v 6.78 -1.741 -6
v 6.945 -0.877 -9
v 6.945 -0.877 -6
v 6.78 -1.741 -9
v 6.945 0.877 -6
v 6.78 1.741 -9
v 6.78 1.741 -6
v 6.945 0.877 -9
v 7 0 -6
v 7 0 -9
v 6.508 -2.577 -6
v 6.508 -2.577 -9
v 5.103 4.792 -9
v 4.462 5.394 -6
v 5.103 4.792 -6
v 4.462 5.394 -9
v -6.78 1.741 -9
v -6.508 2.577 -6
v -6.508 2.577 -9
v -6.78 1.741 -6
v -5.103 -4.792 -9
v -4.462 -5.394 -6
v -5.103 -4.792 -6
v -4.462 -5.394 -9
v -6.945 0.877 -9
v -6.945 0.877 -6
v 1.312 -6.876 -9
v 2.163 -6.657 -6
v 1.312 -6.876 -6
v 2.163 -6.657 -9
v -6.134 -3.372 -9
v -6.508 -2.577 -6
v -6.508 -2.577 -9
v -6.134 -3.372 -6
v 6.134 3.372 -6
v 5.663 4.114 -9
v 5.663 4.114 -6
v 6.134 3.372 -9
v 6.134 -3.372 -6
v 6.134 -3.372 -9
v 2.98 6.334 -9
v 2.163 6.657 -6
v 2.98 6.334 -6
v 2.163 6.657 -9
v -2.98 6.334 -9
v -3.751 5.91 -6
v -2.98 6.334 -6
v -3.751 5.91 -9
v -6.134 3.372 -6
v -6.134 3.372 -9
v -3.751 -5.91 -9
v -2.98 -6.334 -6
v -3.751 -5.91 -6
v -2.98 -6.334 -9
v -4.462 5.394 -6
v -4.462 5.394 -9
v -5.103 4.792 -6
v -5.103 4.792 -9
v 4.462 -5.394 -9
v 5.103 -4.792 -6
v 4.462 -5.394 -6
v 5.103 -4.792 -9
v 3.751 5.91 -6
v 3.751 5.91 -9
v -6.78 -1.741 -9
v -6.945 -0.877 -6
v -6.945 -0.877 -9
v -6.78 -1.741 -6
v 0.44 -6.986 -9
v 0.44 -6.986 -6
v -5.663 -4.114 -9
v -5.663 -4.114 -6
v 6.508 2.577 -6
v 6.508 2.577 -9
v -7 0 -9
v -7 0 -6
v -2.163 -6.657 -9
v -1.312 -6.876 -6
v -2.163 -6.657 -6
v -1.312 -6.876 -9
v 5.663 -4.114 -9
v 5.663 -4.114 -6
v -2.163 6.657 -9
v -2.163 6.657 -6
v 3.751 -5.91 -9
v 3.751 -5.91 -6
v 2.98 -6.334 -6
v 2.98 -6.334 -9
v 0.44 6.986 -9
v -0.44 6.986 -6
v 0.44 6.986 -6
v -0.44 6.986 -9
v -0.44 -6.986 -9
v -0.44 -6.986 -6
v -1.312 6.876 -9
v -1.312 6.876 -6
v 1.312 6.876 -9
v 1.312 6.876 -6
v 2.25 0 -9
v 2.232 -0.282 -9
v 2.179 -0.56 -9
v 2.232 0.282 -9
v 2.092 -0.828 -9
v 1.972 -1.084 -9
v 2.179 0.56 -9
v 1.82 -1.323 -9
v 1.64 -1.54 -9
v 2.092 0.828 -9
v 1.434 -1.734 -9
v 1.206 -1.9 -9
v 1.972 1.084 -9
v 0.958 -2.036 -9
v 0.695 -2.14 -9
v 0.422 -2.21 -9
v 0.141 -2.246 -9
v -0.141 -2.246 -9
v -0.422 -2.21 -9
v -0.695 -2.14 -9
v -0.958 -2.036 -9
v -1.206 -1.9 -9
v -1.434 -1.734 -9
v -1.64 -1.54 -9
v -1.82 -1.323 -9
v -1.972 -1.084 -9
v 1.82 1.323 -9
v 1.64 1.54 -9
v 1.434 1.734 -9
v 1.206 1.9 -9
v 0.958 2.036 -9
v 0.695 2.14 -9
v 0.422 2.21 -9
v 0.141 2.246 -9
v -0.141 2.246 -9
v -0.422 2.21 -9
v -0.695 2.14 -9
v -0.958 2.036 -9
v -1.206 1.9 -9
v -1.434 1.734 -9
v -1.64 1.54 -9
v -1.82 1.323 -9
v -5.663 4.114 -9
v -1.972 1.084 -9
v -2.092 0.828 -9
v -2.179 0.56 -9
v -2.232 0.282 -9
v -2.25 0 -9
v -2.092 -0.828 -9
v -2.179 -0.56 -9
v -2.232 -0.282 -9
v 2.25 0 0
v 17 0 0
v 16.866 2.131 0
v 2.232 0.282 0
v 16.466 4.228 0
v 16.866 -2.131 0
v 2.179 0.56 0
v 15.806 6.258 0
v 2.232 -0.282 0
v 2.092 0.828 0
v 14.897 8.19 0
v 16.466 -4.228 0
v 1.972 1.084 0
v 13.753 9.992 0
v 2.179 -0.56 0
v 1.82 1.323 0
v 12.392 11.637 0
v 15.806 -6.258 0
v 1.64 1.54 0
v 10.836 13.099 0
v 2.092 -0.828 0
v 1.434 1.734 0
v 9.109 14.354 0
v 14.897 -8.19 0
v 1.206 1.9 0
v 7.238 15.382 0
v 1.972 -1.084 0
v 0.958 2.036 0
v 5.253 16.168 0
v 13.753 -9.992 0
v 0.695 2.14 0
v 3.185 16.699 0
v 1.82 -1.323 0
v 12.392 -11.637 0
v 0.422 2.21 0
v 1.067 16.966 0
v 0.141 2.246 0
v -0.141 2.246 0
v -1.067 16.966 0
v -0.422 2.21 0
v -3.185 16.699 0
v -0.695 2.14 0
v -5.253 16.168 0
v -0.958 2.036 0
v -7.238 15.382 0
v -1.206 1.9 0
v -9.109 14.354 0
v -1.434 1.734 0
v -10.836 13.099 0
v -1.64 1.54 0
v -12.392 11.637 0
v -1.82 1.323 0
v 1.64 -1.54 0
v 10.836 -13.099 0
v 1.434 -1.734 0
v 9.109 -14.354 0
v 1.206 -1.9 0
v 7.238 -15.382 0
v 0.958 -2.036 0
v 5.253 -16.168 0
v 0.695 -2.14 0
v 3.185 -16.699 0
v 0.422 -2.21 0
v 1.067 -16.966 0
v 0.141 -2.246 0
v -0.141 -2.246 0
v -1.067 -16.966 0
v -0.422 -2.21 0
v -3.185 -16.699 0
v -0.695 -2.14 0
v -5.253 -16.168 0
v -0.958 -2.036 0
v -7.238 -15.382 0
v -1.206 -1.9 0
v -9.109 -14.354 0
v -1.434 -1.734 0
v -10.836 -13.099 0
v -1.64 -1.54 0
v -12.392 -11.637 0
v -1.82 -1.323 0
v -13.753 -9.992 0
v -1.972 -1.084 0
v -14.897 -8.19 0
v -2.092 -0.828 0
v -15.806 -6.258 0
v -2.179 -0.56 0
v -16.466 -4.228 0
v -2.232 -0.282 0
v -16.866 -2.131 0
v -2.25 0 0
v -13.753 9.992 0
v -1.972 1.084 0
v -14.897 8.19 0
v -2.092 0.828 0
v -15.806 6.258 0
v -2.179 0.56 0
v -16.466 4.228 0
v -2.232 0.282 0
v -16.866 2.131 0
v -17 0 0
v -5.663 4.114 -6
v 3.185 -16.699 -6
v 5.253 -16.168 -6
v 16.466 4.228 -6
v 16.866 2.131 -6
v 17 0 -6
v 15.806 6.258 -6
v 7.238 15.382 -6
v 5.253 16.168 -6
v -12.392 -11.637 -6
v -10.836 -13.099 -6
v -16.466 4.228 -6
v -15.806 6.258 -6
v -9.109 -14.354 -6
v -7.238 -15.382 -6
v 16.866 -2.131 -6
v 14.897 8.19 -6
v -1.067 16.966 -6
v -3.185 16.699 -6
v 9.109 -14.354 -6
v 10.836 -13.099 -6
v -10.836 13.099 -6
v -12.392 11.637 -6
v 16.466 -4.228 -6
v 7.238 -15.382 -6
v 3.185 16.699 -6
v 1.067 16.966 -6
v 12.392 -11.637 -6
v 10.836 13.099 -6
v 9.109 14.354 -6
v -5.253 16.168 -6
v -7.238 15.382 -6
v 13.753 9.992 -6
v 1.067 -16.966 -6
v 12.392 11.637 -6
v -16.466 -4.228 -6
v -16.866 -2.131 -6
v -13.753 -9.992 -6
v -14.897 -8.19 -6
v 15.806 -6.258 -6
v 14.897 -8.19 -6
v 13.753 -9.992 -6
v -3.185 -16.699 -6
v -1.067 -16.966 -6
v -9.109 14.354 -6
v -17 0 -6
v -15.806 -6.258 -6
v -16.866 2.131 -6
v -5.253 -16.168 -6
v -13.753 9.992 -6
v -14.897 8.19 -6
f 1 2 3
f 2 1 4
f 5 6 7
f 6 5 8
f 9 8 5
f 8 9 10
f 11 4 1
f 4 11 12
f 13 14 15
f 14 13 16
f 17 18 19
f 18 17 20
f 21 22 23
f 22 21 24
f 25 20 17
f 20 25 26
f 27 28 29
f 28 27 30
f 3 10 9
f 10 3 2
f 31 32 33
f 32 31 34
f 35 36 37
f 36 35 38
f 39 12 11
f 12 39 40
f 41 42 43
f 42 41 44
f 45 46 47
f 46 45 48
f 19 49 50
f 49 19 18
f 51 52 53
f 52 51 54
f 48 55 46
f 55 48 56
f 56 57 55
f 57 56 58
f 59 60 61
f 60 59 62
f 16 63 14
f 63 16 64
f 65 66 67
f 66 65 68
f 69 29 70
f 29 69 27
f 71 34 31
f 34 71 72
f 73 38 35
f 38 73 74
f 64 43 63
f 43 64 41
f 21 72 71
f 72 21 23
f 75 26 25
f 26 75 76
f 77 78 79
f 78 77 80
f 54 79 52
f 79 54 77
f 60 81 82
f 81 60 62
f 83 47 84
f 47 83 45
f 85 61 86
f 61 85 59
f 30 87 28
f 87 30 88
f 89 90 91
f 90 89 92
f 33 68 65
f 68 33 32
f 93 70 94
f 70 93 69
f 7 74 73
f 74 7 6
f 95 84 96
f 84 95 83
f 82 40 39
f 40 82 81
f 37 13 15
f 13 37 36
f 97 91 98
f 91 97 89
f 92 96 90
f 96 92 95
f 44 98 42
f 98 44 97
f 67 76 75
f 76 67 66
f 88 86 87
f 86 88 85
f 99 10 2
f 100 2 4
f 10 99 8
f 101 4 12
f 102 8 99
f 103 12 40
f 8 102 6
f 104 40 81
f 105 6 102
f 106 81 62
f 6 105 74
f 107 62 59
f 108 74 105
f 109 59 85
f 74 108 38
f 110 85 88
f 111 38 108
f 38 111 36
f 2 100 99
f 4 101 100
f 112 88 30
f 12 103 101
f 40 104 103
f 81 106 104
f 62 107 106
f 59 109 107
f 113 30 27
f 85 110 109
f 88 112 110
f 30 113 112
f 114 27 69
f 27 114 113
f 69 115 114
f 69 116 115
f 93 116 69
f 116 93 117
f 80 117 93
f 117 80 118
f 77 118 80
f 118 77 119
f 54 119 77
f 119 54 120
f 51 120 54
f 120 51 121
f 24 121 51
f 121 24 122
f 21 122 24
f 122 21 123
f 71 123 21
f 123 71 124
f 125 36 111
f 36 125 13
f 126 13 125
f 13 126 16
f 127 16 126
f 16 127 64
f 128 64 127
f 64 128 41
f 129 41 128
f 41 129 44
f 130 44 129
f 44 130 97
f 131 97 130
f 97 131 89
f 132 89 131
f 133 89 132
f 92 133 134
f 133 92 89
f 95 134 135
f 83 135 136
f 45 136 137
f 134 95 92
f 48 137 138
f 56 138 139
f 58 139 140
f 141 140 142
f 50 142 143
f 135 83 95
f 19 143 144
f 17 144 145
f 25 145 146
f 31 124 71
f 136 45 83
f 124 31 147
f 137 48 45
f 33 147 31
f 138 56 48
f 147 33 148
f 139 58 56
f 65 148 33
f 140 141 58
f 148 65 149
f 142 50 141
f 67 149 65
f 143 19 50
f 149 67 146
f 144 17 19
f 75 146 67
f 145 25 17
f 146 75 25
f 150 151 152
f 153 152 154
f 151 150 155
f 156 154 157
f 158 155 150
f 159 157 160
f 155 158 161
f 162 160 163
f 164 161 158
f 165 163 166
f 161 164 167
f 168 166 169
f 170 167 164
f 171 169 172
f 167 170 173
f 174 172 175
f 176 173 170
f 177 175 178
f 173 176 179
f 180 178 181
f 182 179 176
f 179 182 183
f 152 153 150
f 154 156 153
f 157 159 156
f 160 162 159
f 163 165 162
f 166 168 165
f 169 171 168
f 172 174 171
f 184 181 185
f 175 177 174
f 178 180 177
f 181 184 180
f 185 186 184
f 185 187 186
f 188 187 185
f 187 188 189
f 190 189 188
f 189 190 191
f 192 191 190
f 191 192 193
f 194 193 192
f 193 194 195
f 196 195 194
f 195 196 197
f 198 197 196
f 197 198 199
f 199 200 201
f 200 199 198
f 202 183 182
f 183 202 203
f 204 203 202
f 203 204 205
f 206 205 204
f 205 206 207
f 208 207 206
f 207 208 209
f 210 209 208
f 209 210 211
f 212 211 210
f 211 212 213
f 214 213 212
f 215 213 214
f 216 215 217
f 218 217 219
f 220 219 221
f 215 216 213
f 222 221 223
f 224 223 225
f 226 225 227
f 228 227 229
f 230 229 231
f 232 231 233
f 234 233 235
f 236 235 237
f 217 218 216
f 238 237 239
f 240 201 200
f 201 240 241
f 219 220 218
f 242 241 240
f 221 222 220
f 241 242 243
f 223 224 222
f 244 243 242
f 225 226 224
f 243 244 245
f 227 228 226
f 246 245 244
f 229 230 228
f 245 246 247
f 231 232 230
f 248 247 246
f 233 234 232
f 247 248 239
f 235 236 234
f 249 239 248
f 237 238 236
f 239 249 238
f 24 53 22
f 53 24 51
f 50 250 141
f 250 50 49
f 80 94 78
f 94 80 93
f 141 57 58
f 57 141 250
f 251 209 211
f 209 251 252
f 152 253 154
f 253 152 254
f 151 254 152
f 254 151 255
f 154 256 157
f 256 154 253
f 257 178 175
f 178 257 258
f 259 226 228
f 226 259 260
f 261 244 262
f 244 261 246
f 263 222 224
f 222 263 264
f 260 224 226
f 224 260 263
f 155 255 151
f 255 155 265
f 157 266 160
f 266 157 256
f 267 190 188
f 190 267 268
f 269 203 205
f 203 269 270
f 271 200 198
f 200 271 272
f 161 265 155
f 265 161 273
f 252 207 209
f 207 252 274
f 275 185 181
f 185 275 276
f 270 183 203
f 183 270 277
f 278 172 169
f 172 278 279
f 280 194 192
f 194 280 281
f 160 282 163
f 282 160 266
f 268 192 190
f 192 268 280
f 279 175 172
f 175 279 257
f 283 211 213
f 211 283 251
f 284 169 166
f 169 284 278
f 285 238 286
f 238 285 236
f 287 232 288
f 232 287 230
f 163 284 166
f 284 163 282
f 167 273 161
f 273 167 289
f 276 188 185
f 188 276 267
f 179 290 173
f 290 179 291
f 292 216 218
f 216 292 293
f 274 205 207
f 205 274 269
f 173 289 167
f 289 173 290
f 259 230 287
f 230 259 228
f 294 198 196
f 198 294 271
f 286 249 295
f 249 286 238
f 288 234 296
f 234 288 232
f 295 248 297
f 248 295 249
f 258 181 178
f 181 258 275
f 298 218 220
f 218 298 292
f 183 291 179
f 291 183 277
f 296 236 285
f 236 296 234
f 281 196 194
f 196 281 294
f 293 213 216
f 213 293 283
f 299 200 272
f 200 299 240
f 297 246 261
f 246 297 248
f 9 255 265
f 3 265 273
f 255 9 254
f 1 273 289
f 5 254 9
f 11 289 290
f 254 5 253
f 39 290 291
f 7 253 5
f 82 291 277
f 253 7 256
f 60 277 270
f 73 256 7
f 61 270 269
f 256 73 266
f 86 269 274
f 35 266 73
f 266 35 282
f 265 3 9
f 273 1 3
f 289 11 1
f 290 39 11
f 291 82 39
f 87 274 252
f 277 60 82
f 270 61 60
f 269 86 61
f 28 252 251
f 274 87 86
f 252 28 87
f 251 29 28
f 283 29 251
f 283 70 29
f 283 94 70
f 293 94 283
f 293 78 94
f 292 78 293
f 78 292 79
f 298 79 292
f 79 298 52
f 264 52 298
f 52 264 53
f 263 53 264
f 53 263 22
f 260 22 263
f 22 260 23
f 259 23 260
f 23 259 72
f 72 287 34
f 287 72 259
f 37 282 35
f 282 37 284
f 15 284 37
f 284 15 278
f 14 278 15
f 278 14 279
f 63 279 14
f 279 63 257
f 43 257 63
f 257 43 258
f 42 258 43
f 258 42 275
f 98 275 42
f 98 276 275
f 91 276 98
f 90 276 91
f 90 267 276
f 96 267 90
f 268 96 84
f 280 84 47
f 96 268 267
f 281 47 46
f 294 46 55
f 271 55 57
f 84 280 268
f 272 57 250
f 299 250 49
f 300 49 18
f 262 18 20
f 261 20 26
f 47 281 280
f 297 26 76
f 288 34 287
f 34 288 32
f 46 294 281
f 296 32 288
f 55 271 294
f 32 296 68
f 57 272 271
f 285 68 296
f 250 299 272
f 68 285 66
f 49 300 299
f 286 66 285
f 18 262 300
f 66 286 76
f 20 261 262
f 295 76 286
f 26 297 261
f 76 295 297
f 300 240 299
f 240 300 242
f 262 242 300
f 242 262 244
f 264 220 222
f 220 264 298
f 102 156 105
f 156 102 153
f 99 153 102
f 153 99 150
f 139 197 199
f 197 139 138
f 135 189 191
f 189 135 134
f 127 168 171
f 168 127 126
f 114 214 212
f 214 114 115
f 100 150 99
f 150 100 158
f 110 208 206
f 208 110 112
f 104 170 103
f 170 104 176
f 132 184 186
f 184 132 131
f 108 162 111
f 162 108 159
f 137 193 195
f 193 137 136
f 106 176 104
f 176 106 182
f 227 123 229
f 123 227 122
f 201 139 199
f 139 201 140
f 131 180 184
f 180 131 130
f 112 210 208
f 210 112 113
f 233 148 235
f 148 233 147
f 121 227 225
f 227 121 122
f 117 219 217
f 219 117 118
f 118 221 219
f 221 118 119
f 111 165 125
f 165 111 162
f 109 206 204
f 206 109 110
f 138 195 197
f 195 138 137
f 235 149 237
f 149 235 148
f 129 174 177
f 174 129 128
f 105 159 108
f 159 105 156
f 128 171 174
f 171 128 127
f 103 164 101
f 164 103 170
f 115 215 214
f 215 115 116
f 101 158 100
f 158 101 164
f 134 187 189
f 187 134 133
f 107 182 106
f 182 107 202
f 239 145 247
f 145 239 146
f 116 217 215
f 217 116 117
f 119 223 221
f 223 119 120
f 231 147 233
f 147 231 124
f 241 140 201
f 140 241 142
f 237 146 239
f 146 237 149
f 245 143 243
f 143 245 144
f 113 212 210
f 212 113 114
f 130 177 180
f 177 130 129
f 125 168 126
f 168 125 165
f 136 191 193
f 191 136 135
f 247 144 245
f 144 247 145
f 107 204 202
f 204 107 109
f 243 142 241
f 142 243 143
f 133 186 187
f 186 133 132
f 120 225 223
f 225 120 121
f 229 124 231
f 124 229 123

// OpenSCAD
$fn = 50;


difference() {
	union() {
		translate(v = [0, 0, -9.0000000000]) {
			cylinder(h = 9, r = 7.0000000000);
		}
		translate(v = [0, 0, -6.0000000000]) {
			cylinder(h = 6, r = 17.0000000000);
		}
	}
	union() {
		#translate(v = [0, 0, -9]) {
			cylinder(h = 9, r = 2.2500000000);
		}
	}
}
